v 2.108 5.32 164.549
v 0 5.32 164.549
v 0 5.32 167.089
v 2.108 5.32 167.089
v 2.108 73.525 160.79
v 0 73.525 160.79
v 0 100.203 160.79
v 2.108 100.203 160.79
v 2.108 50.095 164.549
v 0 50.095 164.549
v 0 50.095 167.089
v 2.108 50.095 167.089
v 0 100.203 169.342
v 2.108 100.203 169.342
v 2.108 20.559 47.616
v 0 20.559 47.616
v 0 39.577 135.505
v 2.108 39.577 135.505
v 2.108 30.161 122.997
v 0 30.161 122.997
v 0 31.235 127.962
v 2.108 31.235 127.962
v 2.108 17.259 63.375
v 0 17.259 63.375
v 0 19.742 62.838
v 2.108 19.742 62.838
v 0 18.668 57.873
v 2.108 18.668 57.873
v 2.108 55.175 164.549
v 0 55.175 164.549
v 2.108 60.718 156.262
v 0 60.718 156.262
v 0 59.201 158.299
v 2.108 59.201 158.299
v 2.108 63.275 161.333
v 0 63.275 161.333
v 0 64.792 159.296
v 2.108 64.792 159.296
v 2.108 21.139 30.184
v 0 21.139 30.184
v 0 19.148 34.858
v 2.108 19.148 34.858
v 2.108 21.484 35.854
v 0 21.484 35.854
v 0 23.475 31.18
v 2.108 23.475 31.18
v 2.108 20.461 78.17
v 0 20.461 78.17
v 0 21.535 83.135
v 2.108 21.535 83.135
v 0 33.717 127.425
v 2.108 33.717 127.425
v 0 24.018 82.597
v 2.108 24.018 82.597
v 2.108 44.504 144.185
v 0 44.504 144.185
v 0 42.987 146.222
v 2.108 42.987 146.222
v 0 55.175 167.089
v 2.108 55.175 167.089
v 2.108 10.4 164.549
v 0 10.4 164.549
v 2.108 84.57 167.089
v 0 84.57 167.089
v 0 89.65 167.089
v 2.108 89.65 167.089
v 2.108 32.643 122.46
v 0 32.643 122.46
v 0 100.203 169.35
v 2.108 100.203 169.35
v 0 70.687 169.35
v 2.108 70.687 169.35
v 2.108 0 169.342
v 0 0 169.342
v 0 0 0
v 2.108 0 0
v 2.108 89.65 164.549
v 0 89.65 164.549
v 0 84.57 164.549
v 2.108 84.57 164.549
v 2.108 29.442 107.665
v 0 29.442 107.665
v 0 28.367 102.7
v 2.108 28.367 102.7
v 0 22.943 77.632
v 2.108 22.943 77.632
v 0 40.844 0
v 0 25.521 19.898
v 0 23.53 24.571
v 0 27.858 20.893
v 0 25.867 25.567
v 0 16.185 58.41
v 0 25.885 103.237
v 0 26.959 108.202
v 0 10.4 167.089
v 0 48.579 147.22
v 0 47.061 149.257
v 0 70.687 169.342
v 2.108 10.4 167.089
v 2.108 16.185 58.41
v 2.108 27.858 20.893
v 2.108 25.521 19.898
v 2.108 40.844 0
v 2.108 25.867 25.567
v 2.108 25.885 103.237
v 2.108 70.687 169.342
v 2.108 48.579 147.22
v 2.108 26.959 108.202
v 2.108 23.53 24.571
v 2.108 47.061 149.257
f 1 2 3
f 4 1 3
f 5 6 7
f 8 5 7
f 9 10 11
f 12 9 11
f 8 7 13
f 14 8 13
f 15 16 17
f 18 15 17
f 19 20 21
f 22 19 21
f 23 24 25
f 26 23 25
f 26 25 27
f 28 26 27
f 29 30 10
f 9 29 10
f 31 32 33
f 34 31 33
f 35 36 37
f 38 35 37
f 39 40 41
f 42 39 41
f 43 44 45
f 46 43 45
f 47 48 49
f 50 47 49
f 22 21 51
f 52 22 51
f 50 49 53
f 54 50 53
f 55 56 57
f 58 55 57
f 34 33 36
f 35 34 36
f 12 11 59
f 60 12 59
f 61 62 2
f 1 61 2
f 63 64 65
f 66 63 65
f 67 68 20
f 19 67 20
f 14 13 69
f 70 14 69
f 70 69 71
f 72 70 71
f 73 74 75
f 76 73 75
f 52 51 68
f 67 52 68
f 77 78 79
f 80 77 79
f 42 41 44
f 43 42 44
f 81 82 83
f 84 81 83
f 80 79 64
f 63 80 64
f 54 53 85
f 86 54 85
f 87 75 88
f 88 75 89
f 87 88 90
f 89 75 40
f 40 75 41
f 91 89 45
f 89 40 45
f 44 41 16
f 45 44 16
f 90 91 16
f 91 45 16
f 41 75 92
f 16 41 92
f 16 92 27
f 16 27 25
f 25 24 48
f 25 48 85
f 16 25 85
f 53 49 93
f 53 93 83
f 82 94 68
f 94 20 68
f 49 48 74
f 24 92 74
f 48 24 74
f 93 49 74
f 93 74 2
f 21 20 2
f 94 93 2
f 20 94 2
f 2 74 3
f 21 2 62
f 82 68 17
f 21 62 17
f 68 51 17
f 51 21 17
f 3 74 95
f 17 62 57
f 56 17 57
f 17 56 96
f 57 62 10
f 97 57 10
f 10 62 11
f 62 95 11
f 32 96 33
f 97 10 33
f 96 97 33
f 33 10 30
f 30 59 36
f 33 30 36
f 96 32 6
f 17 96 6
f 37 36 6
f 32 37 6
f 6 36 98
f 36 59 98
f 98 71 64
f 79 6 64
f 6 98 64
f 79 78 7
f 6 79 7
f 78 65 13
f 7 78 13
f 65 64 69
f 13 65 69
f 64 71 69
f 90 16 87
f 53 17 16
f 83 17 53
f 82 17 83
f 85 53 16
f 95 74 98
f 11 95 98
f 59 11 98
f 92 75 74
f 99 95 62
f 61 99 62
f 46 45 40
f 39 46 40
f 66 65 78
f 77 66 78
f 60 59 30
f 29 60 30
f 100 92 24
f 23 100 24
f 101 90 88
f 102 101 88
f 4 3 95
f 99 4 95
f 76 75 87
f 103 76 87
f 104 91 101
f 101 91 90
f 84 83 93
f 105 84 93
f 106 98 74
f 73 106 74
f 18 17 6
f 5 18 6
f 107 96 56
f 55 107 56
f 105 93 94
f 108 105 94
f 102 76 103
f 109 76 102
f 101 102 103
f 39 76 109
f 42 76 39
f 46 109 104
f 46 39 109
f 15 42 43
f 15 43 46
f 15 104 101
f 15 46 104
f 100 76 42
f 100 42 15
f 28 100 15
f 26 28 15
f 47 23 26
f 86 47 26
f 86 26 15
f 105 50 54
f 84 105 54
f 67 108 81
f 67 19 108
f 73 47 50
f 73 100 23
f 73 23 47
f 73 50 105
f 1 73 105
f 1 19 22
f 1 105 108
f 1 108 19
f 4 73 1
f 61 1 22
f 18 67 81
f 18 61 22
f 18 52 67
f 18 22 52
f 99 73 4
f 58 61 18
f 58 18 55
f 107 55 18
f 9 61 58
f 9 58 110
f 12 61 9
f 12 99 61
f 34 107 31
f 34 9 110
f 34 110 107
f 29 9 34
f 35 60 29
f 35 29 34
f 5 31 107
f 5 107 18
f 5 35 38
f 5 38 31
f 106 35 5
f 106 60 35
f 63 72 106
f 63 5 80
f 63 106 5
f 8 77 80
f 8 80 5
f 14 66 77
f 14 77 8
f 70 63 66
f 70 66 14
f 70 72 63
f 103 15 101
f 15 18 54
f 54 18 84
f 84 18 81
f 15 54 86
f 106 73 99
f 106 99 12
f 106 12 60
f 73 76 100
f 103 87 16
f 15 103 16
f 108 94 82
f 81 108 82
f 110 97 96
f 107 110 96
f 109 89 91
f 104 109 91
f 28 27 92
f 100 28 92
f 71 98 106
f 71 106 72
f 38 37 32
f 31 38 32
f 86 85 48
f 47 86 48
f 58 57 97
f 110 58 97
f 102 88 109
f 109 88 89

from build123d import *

# Parameters (mm, degrees)
F0_W     = 8.912432854
F0_H     = 0.0079375
F0_W_2   = 2.54
F0_W_3   = 18.0631426697
F1_DEPTH = 2.1082


with BuildPart() as f1:
    # F0 (on Right) → F1 (new body)
    with BuildSketch(Plane.YZ):
        with BuildLine():
            Line((0, 162.0091375), (0, 0))
            Line((0, 0), (12.335197777, 0))
            Line((12.335197777, 0), (18.8042013144, 29.896105485))
            Line((18.8042013144, 29.896105485), (30.5493542935, 2.3257501254))
            Line((30.5493542935, 2.3257501254), (31.5401391658, 0))
            Line((31.5401391658, 0), (31.5707651968, 0))
            Line((31.5707651968, 0), (40.8442968098, 0))
            Line((40.8442968098, 0), (20.5594925834, 47.616175108))
            Line((20.5594925834, 47.616175108), (39.5771112022, 135.5049402038))
            Line((39.5771112022, 135.5049402038), (73.5248959406, 160.7899383022))
            Line((73.5248959406, 160.7899383022), (100.203, 160.7899383022))
            Line((100.203, 160.7899383022), (100.203, 162.0091375))
            Line((100.203, 162.0091375), (82.1398573303, 162.0091375))
            ThreePointArc((82.1398573303, 162.0091375), (80.3438061061, 162.7530862758), (79.5998573303, 164.5491375))
            Line((79.5998573303, 164.5491375), (79.5998573303, 169.3418))
            Line((79.5998573303, 169.3418), (70.6874244764, 169.3418))
            Line((70.6874244764, 169.3418), (70.6874244764, 165.8480664454))
            Line((70.6874244764, 165.8480664454), (70.6874244764, 164.5491375))
            ThreePointArc((70.6874244764, 164.5491375), (70.0510915867, 162.8675752701), (68.4609272063, 162.0285589874))
            ThreePointArc((68.4609272063, 162.0285589874), (68.3044763435, 162.0139975214), (68.1474244764, 162.0091375))
            Line((68.1474244764, 162.0091375), (0, 162.0091375))
        make_face()
        Polygon((21.4843682503, 35.8535070154), (23.4753466245, 31.1799211209), (21.1385536773, 30.1844319338), (19.147575303, 34.8580178283), align=None, mode=Mode.SUBTRACT)
        Polygon((25.8665425285, 25.5668719827), (27.8575209028, 20.8932860882), (25.5207279555, 19.8977969011), (23.5297495813, 24.5713827956), align=None, mode=Mode.SUBTRACT)
        with BuildLine():
            Line((12.3986134924, 50.3752630702), (11.6175919588, 46.7658196656))
            Line((11.6175919588, 46.7658196656), (10.5918, 46.7658196656))
            Line((10.5918, 46.7658196656), (10.5918, 158.7579375))
            Line((10.5918, 158.7579375), (35.8507619547, 158.7579375))
            Line((35.8507619547, 158.7579375), (31.8897708968, 140.4524587956))
            Line((31.8897708968, 140.4524587956), (31.1087493632, 136.8430153909))
            Line((31.1087493632, 136.8430153909), (35.5475592049, 135.882533211))
            ThreePointArc((35.5475592049, 135.882533211), (37.1456481821, 134.7755682604), (37.4929253116, 132.8628062845))
            Line((37.4929253116, 132.8628062845), (29.5595533377, 96.1992113407))
            ThreePointArc((29.5595533377, 96.1992113407), (28.452588387, 94.6011223635), (26.5398264112, 94.2538452339))
            Line((26.5398264112, 94.2538452339), (22.1010165695, 95.2143274138))
            Line((22.1010165695, 95.2143274138), (21.7536814278, 93.6091392306))
            Line((21.7536814278, 93.6091392306), (21.4063462861, 92.0039510473))
            Line((21.4063462861, 92.0039510473), (25.8451561277, 91.0434688674))
            ThreePointArc((25.8451561277, 91.0434688674), (27.4432451049, 89.9365039168), (27.7905222345, 88.0237419409))
            Line((27.7905222345, 88.0237419409), (19.8571502605, 51.3601469971))
            ThreePointArc((19.8571502605, 51.3601469971), (18.7501853099, 49.7620580199), (16.837423334, 49.4147808903))
            Line((16.837423334, 49.4147808903), (12.3986134924, 50.3752630702))
        make_face(mode=Mode.SUBTRACT)
        Polygon((47.0613097153, 149.2568137468), (48.5785484084, 147.2197602993), (44.5044415132, 144.1852829132), (42.9872028202, 146.2223363607), align=None, mode=Mode.SUBTRACT)
        Polygon((44.8088104432, 150.074821282), (46.6876875952, 158.7579375), (56.4668125154, 158.7579375), align=None, mode=Mode.SUBTRACT)
        Polygon((63.2751536106, 161.3332132886), (64.7923923036, 159.296159841), (60.7182854085, 156.2616824549), (59.2010467154, 158.2987359025), align=None, mode=Mode.SUBTRACT)
        with BuildLine():
            Line((0, 164.5491375), (0, 162.0091375))
            Line((0, 162.0091375), (68.1474244764, 162.0091375))
            ThreePointArc((68.1474244764, 162.0091375), (68.3044763435, 162.0139975214), (68.4609272063, 162.0285589874))
            Line((68.4609272063, 162.0285589874), (69.6856973646, 162.9407926238))
            Line((69.6856973646, 162.9407926238), (68.1474244764, 165.0060867035))
            Line((68.1474244764, 165.0060867035), (68.1474244764, 164.5491375))
            Line((68.1474244764, 164.5491375), (55.1748093832, 164.5491375))
            Line((55.1748093832, 164.5491375), (50.0948093832, 164.5491375))
            Line((50.0948093832, 164.5491375), (10.3999171089, 164.5491375))
            Line((10.3999171089, 164.5491375), (5.3199171089, 164.5491375))
            Line((5.3199171089, 164.5491375), (0, 164.5491375))
        make_face()
        Polygon((18.8042013144, 29.896105485), (12.335197777, 0), (13.2072197655, 0), (31.5401391658, 0), (30.5493542935, 2.3257501254), align=None)
        Polygon((0, 169.3418), (0, 164.5491375), (5.3199171089, 164.5491375), (5.3199171089, 167.0891375), (10.3999171089, 167.0891375), (10.3999171089, 164.5491375), (50.0948093832, 164.5491375), (50.0948093832, 167.0891375), (55.1748093832, 167.0891375), (55.1748093832, 164.5491375), (68.1474244764, 164.5491375), (68.1474244764, 165.0060867035), (68.1474244764, 169.3418), align=None)
        with BuildLine():
            Line((69.6856973646, 162.9407926238), (68.4609272063, 162.0285589874))
            ThreePointArc((68.4609272063, 162.0285589874), (70.0510915867, 162.8675752701), (70.6874244764, 164.5491375))
            Line((70.6874244764, 164.5491375), (70.6874244764, 165.8480664454))
            Line((70.6874244764, 165.8480664454), (70.6874244764, 169.3418))
            Line((70.6874244764, 169.3418), (68.1474244764, 169.3418))
            Line((68.1474244764, 169.3418), (68.1474244764, 165.0060867035))
            Line((68.1474244764, 165.0060867035), (69.6856973646, 162.9407926238))
        make_face()
        with Locations((75.1436409033, 169.34576875)):
            Rectangle(F0_W, F0_H)
        with Locations((80.8698573303, 169.34576875)):
            Rectangle(F0_W_2, F0_H)
        with BuildLine():
            Line((82.1398573303, 169.3418), (79.5998573303, 169.3418))
            Line((79.5998573303, 169.3418), (79.5998573303, 164.5491375))
            ThreePointArc((79.5998573303, 164.5491375), (80.3438061061, 162.7530862758), (82.1398573303, 162.0091375))
            Line((82.1398573303, 162.0091375), (100.203, 162.0091375))
            Line((100.203, 162.0091375), (100.203, 164.5491375))
            Line((100.203, 164.5491375), (89.6502663064, 164.5491375))
            Line((89.6502663064, 164.5491375), (84.5702663064, 164.5491375))
            Line((84.5702663064, 164.5491375), (82.1398573303, 164.5491375))
            Line((82.1398573303, 164.5491375), (82.1398573303, 169.3418))
        make_face()
        with Locations((91.1714286652, 169.34576875)):
            Rectangle(F0_W_3, F0_H)
        Polygon((100.203, 169.3418), (82.1398573303, 169.3418), (82.1398573303, 164.5491375), (84.5702663064, 164.5491375), (84.5702663064, 167.0891375), (89.6502663064, 167.0891375), (89.6502663064, 164.5491375), (100.203, 164.5491375), align=None)
        Polygon((10.5918, 46.7658196656), (11.6175919588, 46.7658196656), (12.3986134924, 50.3752630702), (12.9357939022, 52.8578095868), (20.8691658762, 89.5214045307), (21.4063462861, 92.0039510473), (21.7536814278, 93.6091392306), (22.1010165695, 95.2143274138), (22.6381969794, 97.6968739305), (30.5715689534, 134.3604688743), (31.1087493632, 136.8430153909), (31.8897708968, 140.4524587956), (35.8507619547, 158.7579375), (10.5918, 158.7579375), align=None)
        with BuildLine():
            Line((12.9357939022, 52.8578095868), (12.3986134924, 50.3752630702))
            Line((12.3986134924, 50.3752630702), (16.837423334, 49.4147808903))
            ThreePointArc((16.837423334, 49.4147808903), (18.7501853099, 49.7620580199), (19.8571502605, 51.3601469971))
            Line((19.8571502605, 51.3601469971), (27.7905222345, 88.0237419409))
            ThreePointArc((27.7905222345, 88.0237419409), (27.4432451049, 89.9365039168), (25.8451561277, 91.0434688674))
            Line((25.8451561277, 91.0434688674), (21.4063462861, 92.0039510473))
            Line((21.4063462861, 92.0039510473), (20.8691658762, 89.5214045307))
            Line((20.8691658762, 89.5214045307), (25.3079757178, 88.5609223508))
            Line((25.3079757178, 88.5609223508), (24.0175885553, 82.5974767434))
            Line((24.0175885553, 82.5974767434), (22.9432277355, 77.6323837102))
            Line((22.9432277355, 77.6323837102), (19.7419229759, 62.8377489213))
            Line((19.7419229759, 62.8377489213), (18.6675621562, 57.872655888))
            Line((18.6675621562, 57.872655888), (17.3746037439, 51.8973274069))
            Line((17.3746037439, 51.8973274069), (12.9357939022, 52.8578095868))
        make_face()
        Polygon((20.8691658762, 89.5214045307), (12.9357939022, 52.8578095868), (17.3746037439, 51.8973274069), (18.6675621562, 57.872655888), (16.1850156395, 58.4098362979), (17.2593764593, 63.3749293312), (19.7419229759, 62.8377489213), (22.9432277355, 77.6323837102), (20.4606812189, 78.16956412), (21.5350420386, 83.1346571533), (24.0175885553, 82.5974767434), (25.3079757178, 88.5609223508), align=None)
        with BuildLine():
            Line((35.5475592049, 135.882533211), (31.1087493632, 136.8430153909))
            Line((31.1087493632, 136.8430153909), (30.5715689534, 134.3604688743))
            Line((30.5715689534, 134.3604688743), (35.010378795, 133.3999866944))
            Line((35.010378795, 133.3999866944), (33.7174203827, 127.4246582133))
            Line((33.7174203827, 127.4246582133), (32.643059563, 122.45956518))
            Line((32.643059563, 122.45956518), (29.4417548033, 107.6649303911))
            Line((29.4417548033, 107.6649303911), (28.3673939836, 102.6998373579))
            Line((28.3673939836, 102.6998373579), (27.077006821, 96.7363917505))
            Line((27.077006821, 96.7363917505), (22.6381969794, 97.6968739305))
            Line((22.6381969794, 97.6968739305), (22.1010165695, 95.2143274138))
            Line((22.1010165695, 95.2143274138), (26.5398264112, 94.2538452339))
            ThreePointArc((26.5398264112, 94.2538452339), (28.452588387, 94.6011223635), (29.5595533377, 96.1992113407))
            Line((29.5595533377, 96.1992113407), (37.4929253116, 132.8628062845))
            ThreePointArc((37.4929253116, 132.8628062845), (37.1456481821, 134.7755682604), (35.5475592049, 135.882533211))
        make_face()
        Polygon((35.010378795, 133.3999866944), (30.5715689534, 134.3604688743), (22.6381969794, 97.6968739305), (27.077006821, 96.7363917505), (28.3673939836, 102.6998373579), (25.884847467, 103.2370177677), (26.9592082867, 108.202110801), (29.4417548033, 107.6649303911), (32.643059563, 122.45956518), (30.1605130463, 122.9967455899), (31.2348738661, 127.9618386231), (33.7174203827, 127.4246582133), align=None)
        Polygon((56.4668125154, 158.7579375), (46.6876875952, 158.7579375), (44.8088104432, 150.074821282), align=None)
    extrude(amount=F1_DEPTH)


solid = f1.part
